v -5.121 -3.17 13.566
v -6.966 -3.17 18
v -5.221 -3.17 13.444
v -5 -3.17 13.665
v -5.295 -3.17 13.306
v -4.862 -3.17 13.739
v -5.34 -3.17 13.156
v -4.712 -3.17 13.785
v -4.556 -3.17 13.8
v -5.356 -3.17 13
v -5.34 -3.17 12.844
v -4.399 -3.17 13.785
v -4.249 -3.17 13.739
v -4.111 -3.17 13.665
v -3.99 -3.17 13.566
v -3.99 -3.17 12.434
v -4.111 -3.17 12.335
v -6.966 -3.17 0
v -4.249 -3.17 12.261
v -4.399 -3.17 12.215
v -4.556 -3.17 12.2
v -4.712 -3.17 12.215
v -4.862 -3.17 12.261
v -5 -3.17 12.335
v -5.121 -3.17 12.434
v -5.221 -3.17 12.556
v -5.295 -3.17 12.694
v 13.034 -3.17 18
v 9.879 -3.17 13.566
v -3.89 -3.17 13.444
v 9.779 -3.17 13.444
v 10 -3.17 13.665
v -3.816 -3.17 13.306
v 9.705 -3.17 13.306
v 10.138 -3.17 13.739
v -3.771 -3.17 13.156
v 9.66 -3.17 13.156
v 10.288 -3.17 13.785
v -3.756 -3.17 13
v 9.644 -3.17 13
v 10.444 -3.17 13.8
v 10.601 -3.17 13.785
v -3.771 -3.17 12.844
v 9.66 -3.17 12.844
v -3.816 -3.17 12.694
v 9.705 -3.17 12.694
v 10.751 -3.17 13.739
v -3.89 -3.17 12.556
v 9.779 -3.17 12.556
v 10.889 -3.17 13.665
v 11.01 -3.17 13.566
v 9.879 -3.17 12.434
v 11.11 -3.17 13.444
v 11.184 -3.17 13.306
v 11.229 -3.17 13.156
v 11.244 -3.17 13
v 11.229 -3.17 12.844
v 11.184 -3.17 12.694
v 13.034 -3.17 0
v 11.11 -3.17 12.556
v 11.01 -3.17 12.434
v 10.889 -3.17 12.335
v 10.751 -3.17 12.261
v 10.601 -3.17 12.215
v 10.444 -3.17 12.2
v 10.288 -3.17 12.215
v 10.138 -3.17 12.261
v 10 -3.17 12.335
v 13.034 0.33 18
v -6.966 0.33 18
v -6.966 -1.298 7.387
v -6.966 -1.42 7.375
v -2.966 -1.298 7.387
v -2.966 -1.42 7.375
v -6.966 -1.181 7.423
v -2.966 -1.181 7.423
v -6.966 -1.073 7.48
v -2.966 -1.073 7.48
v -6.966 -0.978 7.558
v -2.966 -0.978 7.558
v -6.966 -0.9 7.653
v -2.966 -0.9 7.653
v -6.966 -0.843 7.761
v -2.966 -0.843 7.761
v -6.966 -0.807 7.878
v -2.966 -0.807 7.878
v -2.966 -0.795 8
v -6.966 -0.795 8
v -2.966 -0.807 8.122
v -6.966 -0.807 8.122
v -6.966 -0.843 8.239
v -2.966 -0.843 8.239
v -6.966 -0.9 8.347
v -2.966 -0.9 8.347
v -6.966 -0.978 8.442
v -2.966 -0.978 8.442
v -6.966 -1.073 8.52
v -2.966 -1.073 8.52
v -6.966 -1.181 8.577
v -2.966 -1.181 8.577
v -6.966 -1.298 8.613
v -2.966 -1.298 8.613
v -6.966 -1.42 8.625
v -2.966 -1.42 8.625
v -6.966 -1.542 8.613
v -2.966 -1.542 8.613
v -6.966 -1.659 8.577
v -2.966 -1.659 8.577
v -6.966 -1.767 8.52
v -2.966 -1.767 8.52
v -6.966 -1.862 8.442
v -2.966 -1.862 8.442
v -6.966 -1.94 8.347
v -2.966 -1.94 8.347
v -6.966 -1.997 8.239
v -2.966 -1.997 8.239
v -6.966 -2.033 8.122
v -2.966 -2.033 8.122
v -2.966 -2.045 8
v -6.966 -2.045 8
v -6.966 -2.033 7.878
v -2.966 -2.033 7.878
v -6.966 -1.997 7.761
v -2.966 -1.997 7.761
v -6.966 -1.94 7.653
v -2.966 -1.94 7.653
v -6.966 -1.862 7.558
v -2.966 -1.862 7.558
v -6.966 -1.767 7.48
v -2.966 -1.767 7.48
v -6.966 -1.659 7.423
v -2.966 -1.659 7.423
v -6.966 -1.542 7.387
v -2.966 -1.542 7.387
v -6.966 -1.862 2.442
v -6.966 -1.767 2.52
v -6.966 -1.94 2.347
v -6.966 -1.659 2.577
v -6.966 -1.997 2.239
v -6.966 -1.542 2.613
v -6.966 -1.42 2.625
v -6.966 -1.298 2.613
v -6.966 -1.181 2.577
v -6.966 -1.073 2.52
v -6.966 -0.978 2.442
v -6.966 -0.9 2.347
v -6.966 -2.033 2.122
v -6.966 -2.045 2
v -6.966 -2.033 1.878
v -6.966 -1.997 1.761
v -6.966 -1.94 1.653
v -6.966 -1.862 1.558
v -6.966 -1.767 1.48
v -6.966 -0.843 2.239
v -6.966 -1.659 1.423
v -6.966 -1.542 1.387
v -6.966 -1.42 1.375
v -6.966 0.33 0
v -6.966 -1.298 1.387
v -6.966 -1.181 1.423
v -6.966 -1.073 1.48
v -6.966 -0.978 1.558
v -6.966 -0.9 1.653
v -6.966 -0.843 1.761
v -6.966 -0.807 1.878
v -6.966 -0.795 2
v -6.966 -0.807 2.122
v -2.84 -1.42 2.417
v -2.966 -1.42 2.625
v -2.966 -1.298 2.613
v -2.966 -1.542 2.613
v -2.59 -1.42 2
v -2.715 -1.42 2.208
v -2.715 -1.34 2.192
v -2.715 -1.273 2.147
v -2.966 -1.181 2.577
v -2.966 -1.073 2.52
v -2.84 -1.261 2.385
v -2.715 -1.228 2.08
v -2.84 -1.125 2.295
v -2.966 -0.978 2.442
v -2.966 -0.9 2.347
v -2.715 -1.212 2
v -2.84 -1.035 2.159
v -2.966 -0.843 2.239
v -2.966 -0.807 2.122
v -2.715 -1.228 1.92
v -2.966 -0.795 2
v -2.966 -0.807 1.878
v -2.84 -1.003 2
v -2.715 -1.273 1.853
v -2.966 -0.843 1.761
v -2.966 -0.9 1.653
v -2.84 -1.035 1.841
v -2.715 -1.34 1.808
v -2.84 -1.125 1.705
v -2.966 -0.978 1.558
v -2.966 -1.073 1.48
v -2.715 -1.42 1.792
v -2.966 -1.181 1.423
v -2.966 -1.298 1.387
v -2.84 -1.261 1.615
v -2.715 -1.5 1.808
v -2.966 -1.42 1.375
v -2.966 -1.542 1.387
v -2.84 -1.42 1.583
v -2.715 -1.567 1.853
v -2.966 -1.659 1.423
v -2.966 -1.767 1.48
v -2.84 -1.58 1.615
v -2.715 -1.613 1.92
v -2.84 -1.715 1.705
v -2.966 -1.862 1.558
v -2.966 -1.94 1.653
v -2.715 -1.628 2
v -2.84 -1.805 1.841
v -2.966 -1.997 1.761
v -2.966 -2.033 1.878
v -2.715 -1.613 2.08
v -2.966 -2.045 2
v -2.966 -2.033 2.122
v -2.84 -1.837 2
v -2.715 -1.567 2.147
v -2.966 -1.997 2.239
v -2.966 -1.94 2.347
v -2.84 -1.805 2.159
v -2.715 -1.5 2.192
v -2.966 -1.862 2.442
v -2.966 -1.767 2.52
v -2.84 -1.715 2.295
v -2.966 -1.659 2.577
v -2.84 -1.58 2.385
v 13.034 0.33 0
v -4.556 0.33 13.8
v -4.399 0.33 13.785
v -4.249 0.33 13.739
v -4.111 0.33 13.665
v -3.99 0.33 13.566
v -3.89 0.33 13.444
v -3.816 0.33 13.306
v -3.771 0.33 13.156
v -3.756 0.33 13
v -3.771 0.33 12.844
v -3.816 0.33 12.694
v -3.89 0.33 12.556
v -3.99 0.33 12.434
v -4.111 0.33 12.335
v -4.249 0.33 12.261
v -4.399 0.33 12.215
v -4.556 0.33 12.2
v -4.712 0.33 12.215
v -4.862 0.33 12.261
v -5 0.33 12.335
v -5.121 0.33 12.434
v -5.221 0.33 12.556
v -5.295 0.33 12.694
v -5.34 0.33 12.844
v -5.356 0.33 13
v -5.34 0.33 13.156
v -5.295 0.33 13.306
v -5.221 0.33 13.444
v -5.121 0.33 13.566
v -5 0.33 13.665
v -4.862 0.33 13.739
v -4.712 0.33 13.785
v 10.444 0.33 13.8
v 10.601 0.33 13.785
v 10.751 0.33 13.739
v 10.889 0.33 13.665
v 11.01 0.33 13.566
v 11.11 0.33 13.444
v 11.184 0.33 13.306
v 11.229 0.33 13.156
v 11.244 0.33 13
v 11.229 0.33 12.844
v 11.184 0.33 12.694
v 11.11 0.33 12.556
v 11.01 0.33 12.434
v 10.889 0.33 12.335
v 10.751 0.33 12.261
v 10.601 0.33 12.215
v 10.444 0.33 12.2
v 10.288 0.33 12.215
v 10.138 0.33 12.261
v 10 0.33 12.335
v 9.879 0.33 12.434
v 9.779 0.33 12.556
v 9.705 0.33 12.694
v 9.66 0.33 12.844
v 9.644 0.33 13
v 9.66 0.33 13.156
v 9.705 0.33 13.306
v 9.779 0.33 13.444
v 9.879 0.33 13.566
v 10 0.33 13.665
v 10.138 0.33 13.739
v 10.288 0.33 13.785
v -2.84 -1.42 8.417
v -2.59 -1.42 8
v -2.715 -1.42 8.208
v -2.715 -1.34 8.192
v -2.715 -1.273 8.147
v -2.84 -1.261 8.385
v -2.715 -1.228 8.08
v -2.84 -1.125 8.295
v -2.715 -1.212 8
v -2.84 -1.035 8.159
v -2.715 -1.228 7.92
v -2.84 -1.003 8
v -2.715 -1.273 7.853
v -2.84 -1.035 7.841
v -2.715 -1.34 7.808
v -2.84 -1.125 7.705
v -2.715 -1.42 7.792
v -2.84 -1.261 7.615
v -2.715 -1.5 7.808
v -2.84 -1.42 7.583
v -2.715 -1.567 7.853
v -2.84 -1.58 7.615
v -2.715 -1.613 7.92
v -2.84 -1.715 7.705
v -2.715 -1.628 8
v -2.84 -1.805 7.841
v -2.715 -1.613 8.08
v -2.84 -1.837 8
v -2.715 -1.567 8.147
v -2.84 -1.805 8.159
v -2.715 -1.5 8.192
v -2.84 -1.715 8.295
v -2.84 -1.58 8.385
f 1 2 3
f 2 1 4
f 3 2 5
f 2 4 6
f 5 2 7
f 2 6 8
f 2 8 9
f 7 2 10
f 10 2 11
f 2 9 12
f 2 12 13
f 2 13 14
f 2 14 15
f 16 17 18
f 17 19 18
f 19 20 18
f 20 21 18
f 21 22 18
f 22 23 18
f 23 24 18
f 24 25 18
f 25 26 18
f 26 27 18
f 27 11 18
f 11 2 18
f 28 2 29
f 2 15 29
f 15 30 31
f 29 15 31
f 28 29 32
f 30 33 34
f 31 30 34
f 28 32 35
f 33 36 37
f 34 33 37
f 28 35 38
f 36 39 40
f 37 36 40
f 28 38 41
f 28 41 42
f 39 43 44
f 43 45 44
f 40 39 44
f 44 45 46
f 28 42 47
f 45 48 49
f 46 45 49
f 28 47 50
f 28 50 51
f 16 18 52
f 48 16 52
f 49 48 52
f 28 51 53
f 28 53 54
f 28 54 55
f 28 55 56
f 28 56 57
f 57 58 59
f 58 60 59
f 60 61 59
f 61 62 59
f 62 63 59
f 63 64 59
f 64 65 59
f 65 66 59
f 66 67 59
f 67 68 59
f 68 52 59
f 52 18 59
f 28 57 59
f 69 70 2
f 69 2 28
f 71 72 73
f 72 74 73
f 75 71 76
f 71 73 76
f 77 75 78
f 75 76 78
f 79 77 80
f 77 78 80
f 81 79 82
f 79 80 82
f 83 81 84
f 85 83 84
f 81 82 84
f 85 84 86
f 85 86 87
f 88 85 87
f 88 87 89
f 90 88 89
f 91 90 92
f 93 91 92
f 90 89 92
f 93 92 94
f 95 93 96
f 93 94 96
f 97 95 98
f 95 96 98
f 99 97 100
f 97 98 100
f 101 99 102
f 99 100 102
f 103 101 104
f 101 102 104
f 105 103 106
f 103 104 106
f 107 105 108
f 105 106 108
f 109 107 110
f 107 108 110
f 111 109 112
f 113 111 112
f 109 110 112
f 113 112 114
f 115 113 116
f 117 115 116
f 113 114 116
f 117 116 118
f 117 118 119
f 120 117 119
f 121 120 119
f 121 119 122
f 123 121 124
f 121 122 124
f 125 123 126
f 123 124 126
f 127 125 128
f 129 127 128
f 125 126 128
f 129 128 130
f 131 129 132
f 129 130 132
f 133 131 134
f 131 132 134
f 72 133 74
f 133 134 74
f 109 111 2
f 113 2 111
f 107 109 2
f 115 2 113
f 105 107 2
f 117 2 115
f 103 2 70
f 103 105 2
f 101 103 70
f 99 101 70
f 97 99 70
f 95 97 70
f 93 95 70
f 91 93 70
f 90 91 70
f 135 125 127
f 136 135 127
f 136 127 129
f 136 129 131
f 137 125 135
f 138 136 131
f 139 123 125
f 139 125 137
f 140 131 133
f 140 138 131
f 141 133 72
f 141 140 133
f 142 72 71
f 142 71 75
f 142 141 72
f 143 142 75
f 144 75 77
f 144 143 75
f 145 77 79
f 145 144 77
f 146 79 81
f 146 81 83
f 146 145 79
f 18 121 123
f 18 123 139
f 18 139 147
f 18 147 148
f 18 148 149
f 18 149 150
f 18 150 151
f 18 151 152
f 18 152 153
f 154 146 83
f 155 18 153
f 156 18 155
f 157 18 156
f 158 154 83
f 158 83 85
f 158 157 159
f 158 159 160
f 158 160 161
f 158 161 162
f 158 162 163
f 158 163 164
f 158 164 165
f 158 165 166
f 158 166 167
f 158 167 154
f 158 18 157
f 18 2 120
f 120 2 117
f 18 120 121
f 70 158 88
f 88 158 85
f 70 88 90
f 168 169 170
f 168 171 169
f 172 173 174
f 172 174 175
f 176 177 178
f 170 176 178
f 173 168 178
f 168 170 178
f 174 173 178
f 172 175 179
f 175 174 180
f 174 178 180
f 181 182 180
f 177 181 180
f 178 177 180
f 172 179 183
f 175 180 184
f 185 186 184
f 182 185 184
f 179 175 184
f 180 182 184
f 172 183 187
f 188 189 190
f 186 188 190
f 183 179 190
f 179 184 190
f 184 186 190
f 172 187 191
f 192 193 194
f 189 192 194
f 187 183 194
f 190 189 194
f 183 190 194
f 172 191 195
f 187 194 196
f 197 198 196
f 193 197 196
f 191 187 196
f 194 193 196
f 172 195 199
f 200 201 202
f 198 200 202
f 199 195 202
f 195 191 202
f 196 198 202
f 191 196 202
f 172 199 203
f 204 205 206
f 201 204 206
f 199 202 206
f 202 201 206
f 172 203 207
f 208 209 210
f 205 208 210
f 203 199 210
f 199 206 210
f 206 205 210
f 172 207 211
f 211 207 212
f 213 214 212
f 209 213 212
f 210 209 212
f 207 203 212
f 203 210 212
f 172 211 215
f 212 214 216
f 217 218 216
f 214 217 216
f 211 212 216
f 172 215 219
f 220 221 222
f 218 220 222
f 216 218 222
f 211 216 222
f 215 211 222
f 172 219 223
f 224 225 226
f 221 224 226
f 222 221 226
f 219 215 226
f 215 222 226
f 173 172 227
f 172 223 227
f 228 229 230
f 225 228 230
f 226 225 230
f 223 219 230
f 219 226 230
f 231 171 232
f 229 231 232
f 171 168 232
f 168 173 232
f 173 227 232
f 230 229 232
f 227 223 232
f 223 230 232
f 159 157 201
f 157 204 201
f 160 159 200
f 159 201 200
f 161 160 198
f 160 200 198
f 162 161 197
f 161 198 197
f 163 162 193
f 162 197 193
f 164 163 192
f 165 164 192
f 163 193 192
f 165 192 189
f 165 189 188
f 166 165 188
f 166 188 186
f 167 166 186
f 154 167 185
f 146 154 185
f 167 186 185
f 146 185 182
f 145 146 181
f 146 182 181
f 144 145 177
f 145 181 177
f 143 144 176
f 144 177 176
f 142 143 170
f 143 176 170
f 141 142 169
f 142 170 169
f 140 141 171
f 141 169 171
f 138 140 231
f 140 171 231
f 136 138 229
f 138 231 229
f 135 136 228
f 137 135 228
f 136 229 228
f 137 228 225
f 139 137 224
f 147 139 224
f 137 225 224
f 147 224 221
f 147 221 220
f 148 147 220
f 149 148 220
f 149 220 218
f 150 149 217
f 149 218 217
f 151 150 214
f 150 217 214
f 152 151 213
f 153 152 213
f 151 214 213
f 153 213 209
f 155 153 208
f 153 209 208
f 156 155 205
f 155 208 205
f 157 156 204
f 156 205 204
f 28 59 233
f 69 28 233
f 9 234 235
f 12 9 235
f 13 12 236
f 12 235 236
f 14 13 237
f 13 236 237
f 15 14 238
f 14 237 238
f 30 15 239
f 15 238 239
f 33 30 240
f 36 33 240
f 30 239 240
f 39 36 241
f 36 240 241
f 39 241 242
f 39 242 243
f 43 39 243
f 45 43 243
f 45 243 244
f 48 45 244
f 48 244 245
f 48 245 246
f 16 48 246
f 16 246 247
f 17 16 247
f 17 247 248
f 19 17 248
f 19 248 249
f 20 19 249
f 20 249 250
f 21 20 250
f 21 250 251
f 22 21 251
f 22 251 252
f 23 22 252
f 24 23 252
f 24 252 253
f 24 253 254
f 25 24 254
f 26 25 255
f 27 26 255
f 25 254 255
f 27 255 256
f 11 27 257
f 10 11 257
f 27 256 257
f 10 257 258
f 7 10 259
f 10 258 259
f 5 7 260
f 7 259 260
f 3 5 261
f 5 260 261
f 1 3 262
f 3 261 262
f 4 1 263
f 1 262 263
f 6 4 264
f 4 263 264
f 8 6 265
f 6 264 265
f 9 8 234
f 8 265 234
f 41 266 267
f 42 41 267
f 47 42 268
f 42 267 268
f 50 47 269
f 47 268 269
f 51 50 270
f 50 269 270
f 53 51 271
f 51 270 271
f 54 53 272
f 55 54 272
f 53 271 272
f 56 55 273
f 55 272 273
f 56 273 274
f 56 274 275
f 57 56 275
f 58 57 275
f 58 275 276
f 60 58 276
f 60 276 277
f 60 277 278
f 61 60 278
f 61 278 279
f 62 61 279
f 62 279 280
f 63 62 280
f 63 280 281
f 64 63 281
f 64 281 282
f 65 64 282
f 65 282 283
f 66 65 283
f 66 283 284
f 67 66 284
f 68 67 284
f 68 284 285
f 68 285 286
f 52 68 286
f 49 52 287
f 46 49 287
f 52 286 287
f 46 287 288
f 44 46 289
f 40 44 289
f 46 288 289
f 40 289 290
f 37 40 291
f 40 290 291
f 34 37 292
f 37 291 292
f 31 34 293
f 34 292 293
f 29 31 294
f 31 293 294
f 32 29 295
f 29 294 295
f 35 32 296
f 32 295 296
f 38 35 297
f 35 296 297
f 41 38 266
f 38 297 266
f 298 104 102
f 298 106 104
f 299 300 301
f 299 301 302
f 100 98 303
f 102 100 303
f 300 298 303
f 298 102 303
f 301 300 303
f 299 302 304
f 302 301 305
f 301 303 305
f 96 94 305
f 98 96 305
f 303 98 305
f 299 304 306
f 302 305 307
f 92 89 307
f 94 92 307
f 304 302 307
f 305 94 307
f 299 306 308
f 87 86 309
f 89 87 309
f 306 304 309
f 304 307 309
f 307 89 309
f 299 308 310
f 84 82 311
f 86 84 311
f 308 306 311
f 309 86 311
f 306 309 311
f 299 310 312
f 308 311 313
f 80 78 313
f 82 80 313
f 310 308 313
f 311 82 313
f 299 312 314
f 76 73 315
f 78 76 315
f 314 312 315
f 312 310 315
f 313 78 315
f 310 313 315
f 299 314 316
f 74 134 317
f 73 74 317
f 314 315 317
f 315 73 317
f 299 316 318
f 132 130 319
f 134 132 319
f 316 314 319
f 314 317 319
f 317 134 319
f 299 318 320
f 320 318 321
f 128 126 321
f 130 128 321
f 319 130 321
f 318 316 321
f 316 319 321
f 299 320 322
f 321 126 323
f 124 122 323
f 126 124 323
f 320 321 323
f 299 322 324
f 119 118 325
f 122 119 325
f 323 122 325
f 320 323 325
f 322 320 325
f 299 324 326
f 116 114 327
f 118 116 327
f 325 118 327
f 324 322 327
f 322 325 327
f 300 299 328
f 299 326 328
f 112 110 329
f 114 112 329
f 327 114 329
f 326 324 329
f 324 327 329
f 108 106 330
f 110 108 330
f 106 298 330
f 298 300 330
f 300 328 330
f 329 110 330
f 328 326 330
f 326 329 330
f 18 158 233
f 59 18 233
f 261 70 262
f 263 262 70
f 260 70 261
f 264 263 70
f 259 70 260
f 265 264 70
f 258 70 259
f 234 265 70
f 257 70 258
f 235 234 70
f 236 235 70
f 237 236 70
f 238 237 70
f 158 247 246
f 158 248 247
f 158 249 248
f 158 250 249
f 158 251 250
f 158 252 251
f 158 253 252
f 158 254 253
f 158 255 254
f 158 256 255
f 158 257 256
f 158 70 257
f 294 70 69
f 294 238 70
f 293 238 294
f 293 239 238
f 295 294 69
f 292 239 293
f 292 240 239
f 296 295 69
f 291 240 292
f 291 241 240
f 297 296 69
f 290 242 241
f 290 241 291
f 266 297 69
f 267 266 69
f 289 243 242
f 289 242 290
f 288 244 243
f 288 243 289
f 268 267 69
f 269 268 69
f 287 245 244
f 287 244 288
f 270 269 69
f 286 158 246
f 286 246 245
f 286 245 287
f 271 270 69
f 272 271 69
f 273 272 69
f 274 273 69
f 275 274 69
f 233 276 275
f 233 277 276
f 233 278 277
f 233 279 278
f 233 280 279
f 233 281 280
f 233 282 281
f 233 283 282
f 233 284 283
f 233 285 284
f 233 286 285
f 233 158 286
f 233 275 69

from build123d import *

# Parameters (mm, degrees)
SKETCH_1_W               = 20
SKETCH_1_H               = 3.5
EXTRUDE_1_DEPTH          = 18
SKETCH_2_R               = 0.8
CUT_EXTRUDE_1_DEPTH      = 23.497727458
HOLE_WIZARD_M1_6_1_D     = 1.25
HOLE_WIZARD_M1_6_1_DEPTH = 4
HOLE_WIZARD_M1_6_1_TIP   = 0.375537887


with BuildPart() as part:
    # 草图1 → 凸台-拉伸1 (new body)
    with BuildSketch(Plane.XY):
        with Locations((3.034482759, -1.420060756)):
            Rectangle(SKETCH_1_W, SKETCH_1_H)
    extrude(amount=EXTRUDE_1_DEPTH)

    # 草图2 → 切除-拉伸1 (cut, through all)
    with BuildSketch(Plane(origin=(0, 0.329939244, 0), x_dir=(1, 0, 0), z_dir=(0, 1, 0))):
        with Locations(Location((-4.555517241, -13, 0), (0, 0, 270))):
            Circle(SKETCH_2_R)
        with Locations(Location((10.444482759, -13, 0), (0, 0, 270))):
            Circle(SKETCH_2_R)
    extrude(amount=-CUT_EXTRUDE_1_DEPTH, mode=Mode.SUBTRACT)

    # M1.6 螺纹孔1
    with Locations(Plane.ZY.offset(6.965517241)):
        with Locations((2, -1.420060756), (8, -1.420060756)):
            Hole(HOLE_WIZARD_M1_6_1_D / 2, depth=HOLE_WIZARD_M1_6_1_DEPTH)
            with Locations((0, 0, -(HOLE_WIZARD_M1_6_1_DEPTH + HOLE_WIZARD_M1_6_1_TIP / 2))):  # 118° drill point
                Cone(0, HOLE_WIZARD_M1_6_1_D / 2, HOLE_WIZARD_M1_6_1_TIP, mode=Mode.SUBTRACT)


solid = part.part
